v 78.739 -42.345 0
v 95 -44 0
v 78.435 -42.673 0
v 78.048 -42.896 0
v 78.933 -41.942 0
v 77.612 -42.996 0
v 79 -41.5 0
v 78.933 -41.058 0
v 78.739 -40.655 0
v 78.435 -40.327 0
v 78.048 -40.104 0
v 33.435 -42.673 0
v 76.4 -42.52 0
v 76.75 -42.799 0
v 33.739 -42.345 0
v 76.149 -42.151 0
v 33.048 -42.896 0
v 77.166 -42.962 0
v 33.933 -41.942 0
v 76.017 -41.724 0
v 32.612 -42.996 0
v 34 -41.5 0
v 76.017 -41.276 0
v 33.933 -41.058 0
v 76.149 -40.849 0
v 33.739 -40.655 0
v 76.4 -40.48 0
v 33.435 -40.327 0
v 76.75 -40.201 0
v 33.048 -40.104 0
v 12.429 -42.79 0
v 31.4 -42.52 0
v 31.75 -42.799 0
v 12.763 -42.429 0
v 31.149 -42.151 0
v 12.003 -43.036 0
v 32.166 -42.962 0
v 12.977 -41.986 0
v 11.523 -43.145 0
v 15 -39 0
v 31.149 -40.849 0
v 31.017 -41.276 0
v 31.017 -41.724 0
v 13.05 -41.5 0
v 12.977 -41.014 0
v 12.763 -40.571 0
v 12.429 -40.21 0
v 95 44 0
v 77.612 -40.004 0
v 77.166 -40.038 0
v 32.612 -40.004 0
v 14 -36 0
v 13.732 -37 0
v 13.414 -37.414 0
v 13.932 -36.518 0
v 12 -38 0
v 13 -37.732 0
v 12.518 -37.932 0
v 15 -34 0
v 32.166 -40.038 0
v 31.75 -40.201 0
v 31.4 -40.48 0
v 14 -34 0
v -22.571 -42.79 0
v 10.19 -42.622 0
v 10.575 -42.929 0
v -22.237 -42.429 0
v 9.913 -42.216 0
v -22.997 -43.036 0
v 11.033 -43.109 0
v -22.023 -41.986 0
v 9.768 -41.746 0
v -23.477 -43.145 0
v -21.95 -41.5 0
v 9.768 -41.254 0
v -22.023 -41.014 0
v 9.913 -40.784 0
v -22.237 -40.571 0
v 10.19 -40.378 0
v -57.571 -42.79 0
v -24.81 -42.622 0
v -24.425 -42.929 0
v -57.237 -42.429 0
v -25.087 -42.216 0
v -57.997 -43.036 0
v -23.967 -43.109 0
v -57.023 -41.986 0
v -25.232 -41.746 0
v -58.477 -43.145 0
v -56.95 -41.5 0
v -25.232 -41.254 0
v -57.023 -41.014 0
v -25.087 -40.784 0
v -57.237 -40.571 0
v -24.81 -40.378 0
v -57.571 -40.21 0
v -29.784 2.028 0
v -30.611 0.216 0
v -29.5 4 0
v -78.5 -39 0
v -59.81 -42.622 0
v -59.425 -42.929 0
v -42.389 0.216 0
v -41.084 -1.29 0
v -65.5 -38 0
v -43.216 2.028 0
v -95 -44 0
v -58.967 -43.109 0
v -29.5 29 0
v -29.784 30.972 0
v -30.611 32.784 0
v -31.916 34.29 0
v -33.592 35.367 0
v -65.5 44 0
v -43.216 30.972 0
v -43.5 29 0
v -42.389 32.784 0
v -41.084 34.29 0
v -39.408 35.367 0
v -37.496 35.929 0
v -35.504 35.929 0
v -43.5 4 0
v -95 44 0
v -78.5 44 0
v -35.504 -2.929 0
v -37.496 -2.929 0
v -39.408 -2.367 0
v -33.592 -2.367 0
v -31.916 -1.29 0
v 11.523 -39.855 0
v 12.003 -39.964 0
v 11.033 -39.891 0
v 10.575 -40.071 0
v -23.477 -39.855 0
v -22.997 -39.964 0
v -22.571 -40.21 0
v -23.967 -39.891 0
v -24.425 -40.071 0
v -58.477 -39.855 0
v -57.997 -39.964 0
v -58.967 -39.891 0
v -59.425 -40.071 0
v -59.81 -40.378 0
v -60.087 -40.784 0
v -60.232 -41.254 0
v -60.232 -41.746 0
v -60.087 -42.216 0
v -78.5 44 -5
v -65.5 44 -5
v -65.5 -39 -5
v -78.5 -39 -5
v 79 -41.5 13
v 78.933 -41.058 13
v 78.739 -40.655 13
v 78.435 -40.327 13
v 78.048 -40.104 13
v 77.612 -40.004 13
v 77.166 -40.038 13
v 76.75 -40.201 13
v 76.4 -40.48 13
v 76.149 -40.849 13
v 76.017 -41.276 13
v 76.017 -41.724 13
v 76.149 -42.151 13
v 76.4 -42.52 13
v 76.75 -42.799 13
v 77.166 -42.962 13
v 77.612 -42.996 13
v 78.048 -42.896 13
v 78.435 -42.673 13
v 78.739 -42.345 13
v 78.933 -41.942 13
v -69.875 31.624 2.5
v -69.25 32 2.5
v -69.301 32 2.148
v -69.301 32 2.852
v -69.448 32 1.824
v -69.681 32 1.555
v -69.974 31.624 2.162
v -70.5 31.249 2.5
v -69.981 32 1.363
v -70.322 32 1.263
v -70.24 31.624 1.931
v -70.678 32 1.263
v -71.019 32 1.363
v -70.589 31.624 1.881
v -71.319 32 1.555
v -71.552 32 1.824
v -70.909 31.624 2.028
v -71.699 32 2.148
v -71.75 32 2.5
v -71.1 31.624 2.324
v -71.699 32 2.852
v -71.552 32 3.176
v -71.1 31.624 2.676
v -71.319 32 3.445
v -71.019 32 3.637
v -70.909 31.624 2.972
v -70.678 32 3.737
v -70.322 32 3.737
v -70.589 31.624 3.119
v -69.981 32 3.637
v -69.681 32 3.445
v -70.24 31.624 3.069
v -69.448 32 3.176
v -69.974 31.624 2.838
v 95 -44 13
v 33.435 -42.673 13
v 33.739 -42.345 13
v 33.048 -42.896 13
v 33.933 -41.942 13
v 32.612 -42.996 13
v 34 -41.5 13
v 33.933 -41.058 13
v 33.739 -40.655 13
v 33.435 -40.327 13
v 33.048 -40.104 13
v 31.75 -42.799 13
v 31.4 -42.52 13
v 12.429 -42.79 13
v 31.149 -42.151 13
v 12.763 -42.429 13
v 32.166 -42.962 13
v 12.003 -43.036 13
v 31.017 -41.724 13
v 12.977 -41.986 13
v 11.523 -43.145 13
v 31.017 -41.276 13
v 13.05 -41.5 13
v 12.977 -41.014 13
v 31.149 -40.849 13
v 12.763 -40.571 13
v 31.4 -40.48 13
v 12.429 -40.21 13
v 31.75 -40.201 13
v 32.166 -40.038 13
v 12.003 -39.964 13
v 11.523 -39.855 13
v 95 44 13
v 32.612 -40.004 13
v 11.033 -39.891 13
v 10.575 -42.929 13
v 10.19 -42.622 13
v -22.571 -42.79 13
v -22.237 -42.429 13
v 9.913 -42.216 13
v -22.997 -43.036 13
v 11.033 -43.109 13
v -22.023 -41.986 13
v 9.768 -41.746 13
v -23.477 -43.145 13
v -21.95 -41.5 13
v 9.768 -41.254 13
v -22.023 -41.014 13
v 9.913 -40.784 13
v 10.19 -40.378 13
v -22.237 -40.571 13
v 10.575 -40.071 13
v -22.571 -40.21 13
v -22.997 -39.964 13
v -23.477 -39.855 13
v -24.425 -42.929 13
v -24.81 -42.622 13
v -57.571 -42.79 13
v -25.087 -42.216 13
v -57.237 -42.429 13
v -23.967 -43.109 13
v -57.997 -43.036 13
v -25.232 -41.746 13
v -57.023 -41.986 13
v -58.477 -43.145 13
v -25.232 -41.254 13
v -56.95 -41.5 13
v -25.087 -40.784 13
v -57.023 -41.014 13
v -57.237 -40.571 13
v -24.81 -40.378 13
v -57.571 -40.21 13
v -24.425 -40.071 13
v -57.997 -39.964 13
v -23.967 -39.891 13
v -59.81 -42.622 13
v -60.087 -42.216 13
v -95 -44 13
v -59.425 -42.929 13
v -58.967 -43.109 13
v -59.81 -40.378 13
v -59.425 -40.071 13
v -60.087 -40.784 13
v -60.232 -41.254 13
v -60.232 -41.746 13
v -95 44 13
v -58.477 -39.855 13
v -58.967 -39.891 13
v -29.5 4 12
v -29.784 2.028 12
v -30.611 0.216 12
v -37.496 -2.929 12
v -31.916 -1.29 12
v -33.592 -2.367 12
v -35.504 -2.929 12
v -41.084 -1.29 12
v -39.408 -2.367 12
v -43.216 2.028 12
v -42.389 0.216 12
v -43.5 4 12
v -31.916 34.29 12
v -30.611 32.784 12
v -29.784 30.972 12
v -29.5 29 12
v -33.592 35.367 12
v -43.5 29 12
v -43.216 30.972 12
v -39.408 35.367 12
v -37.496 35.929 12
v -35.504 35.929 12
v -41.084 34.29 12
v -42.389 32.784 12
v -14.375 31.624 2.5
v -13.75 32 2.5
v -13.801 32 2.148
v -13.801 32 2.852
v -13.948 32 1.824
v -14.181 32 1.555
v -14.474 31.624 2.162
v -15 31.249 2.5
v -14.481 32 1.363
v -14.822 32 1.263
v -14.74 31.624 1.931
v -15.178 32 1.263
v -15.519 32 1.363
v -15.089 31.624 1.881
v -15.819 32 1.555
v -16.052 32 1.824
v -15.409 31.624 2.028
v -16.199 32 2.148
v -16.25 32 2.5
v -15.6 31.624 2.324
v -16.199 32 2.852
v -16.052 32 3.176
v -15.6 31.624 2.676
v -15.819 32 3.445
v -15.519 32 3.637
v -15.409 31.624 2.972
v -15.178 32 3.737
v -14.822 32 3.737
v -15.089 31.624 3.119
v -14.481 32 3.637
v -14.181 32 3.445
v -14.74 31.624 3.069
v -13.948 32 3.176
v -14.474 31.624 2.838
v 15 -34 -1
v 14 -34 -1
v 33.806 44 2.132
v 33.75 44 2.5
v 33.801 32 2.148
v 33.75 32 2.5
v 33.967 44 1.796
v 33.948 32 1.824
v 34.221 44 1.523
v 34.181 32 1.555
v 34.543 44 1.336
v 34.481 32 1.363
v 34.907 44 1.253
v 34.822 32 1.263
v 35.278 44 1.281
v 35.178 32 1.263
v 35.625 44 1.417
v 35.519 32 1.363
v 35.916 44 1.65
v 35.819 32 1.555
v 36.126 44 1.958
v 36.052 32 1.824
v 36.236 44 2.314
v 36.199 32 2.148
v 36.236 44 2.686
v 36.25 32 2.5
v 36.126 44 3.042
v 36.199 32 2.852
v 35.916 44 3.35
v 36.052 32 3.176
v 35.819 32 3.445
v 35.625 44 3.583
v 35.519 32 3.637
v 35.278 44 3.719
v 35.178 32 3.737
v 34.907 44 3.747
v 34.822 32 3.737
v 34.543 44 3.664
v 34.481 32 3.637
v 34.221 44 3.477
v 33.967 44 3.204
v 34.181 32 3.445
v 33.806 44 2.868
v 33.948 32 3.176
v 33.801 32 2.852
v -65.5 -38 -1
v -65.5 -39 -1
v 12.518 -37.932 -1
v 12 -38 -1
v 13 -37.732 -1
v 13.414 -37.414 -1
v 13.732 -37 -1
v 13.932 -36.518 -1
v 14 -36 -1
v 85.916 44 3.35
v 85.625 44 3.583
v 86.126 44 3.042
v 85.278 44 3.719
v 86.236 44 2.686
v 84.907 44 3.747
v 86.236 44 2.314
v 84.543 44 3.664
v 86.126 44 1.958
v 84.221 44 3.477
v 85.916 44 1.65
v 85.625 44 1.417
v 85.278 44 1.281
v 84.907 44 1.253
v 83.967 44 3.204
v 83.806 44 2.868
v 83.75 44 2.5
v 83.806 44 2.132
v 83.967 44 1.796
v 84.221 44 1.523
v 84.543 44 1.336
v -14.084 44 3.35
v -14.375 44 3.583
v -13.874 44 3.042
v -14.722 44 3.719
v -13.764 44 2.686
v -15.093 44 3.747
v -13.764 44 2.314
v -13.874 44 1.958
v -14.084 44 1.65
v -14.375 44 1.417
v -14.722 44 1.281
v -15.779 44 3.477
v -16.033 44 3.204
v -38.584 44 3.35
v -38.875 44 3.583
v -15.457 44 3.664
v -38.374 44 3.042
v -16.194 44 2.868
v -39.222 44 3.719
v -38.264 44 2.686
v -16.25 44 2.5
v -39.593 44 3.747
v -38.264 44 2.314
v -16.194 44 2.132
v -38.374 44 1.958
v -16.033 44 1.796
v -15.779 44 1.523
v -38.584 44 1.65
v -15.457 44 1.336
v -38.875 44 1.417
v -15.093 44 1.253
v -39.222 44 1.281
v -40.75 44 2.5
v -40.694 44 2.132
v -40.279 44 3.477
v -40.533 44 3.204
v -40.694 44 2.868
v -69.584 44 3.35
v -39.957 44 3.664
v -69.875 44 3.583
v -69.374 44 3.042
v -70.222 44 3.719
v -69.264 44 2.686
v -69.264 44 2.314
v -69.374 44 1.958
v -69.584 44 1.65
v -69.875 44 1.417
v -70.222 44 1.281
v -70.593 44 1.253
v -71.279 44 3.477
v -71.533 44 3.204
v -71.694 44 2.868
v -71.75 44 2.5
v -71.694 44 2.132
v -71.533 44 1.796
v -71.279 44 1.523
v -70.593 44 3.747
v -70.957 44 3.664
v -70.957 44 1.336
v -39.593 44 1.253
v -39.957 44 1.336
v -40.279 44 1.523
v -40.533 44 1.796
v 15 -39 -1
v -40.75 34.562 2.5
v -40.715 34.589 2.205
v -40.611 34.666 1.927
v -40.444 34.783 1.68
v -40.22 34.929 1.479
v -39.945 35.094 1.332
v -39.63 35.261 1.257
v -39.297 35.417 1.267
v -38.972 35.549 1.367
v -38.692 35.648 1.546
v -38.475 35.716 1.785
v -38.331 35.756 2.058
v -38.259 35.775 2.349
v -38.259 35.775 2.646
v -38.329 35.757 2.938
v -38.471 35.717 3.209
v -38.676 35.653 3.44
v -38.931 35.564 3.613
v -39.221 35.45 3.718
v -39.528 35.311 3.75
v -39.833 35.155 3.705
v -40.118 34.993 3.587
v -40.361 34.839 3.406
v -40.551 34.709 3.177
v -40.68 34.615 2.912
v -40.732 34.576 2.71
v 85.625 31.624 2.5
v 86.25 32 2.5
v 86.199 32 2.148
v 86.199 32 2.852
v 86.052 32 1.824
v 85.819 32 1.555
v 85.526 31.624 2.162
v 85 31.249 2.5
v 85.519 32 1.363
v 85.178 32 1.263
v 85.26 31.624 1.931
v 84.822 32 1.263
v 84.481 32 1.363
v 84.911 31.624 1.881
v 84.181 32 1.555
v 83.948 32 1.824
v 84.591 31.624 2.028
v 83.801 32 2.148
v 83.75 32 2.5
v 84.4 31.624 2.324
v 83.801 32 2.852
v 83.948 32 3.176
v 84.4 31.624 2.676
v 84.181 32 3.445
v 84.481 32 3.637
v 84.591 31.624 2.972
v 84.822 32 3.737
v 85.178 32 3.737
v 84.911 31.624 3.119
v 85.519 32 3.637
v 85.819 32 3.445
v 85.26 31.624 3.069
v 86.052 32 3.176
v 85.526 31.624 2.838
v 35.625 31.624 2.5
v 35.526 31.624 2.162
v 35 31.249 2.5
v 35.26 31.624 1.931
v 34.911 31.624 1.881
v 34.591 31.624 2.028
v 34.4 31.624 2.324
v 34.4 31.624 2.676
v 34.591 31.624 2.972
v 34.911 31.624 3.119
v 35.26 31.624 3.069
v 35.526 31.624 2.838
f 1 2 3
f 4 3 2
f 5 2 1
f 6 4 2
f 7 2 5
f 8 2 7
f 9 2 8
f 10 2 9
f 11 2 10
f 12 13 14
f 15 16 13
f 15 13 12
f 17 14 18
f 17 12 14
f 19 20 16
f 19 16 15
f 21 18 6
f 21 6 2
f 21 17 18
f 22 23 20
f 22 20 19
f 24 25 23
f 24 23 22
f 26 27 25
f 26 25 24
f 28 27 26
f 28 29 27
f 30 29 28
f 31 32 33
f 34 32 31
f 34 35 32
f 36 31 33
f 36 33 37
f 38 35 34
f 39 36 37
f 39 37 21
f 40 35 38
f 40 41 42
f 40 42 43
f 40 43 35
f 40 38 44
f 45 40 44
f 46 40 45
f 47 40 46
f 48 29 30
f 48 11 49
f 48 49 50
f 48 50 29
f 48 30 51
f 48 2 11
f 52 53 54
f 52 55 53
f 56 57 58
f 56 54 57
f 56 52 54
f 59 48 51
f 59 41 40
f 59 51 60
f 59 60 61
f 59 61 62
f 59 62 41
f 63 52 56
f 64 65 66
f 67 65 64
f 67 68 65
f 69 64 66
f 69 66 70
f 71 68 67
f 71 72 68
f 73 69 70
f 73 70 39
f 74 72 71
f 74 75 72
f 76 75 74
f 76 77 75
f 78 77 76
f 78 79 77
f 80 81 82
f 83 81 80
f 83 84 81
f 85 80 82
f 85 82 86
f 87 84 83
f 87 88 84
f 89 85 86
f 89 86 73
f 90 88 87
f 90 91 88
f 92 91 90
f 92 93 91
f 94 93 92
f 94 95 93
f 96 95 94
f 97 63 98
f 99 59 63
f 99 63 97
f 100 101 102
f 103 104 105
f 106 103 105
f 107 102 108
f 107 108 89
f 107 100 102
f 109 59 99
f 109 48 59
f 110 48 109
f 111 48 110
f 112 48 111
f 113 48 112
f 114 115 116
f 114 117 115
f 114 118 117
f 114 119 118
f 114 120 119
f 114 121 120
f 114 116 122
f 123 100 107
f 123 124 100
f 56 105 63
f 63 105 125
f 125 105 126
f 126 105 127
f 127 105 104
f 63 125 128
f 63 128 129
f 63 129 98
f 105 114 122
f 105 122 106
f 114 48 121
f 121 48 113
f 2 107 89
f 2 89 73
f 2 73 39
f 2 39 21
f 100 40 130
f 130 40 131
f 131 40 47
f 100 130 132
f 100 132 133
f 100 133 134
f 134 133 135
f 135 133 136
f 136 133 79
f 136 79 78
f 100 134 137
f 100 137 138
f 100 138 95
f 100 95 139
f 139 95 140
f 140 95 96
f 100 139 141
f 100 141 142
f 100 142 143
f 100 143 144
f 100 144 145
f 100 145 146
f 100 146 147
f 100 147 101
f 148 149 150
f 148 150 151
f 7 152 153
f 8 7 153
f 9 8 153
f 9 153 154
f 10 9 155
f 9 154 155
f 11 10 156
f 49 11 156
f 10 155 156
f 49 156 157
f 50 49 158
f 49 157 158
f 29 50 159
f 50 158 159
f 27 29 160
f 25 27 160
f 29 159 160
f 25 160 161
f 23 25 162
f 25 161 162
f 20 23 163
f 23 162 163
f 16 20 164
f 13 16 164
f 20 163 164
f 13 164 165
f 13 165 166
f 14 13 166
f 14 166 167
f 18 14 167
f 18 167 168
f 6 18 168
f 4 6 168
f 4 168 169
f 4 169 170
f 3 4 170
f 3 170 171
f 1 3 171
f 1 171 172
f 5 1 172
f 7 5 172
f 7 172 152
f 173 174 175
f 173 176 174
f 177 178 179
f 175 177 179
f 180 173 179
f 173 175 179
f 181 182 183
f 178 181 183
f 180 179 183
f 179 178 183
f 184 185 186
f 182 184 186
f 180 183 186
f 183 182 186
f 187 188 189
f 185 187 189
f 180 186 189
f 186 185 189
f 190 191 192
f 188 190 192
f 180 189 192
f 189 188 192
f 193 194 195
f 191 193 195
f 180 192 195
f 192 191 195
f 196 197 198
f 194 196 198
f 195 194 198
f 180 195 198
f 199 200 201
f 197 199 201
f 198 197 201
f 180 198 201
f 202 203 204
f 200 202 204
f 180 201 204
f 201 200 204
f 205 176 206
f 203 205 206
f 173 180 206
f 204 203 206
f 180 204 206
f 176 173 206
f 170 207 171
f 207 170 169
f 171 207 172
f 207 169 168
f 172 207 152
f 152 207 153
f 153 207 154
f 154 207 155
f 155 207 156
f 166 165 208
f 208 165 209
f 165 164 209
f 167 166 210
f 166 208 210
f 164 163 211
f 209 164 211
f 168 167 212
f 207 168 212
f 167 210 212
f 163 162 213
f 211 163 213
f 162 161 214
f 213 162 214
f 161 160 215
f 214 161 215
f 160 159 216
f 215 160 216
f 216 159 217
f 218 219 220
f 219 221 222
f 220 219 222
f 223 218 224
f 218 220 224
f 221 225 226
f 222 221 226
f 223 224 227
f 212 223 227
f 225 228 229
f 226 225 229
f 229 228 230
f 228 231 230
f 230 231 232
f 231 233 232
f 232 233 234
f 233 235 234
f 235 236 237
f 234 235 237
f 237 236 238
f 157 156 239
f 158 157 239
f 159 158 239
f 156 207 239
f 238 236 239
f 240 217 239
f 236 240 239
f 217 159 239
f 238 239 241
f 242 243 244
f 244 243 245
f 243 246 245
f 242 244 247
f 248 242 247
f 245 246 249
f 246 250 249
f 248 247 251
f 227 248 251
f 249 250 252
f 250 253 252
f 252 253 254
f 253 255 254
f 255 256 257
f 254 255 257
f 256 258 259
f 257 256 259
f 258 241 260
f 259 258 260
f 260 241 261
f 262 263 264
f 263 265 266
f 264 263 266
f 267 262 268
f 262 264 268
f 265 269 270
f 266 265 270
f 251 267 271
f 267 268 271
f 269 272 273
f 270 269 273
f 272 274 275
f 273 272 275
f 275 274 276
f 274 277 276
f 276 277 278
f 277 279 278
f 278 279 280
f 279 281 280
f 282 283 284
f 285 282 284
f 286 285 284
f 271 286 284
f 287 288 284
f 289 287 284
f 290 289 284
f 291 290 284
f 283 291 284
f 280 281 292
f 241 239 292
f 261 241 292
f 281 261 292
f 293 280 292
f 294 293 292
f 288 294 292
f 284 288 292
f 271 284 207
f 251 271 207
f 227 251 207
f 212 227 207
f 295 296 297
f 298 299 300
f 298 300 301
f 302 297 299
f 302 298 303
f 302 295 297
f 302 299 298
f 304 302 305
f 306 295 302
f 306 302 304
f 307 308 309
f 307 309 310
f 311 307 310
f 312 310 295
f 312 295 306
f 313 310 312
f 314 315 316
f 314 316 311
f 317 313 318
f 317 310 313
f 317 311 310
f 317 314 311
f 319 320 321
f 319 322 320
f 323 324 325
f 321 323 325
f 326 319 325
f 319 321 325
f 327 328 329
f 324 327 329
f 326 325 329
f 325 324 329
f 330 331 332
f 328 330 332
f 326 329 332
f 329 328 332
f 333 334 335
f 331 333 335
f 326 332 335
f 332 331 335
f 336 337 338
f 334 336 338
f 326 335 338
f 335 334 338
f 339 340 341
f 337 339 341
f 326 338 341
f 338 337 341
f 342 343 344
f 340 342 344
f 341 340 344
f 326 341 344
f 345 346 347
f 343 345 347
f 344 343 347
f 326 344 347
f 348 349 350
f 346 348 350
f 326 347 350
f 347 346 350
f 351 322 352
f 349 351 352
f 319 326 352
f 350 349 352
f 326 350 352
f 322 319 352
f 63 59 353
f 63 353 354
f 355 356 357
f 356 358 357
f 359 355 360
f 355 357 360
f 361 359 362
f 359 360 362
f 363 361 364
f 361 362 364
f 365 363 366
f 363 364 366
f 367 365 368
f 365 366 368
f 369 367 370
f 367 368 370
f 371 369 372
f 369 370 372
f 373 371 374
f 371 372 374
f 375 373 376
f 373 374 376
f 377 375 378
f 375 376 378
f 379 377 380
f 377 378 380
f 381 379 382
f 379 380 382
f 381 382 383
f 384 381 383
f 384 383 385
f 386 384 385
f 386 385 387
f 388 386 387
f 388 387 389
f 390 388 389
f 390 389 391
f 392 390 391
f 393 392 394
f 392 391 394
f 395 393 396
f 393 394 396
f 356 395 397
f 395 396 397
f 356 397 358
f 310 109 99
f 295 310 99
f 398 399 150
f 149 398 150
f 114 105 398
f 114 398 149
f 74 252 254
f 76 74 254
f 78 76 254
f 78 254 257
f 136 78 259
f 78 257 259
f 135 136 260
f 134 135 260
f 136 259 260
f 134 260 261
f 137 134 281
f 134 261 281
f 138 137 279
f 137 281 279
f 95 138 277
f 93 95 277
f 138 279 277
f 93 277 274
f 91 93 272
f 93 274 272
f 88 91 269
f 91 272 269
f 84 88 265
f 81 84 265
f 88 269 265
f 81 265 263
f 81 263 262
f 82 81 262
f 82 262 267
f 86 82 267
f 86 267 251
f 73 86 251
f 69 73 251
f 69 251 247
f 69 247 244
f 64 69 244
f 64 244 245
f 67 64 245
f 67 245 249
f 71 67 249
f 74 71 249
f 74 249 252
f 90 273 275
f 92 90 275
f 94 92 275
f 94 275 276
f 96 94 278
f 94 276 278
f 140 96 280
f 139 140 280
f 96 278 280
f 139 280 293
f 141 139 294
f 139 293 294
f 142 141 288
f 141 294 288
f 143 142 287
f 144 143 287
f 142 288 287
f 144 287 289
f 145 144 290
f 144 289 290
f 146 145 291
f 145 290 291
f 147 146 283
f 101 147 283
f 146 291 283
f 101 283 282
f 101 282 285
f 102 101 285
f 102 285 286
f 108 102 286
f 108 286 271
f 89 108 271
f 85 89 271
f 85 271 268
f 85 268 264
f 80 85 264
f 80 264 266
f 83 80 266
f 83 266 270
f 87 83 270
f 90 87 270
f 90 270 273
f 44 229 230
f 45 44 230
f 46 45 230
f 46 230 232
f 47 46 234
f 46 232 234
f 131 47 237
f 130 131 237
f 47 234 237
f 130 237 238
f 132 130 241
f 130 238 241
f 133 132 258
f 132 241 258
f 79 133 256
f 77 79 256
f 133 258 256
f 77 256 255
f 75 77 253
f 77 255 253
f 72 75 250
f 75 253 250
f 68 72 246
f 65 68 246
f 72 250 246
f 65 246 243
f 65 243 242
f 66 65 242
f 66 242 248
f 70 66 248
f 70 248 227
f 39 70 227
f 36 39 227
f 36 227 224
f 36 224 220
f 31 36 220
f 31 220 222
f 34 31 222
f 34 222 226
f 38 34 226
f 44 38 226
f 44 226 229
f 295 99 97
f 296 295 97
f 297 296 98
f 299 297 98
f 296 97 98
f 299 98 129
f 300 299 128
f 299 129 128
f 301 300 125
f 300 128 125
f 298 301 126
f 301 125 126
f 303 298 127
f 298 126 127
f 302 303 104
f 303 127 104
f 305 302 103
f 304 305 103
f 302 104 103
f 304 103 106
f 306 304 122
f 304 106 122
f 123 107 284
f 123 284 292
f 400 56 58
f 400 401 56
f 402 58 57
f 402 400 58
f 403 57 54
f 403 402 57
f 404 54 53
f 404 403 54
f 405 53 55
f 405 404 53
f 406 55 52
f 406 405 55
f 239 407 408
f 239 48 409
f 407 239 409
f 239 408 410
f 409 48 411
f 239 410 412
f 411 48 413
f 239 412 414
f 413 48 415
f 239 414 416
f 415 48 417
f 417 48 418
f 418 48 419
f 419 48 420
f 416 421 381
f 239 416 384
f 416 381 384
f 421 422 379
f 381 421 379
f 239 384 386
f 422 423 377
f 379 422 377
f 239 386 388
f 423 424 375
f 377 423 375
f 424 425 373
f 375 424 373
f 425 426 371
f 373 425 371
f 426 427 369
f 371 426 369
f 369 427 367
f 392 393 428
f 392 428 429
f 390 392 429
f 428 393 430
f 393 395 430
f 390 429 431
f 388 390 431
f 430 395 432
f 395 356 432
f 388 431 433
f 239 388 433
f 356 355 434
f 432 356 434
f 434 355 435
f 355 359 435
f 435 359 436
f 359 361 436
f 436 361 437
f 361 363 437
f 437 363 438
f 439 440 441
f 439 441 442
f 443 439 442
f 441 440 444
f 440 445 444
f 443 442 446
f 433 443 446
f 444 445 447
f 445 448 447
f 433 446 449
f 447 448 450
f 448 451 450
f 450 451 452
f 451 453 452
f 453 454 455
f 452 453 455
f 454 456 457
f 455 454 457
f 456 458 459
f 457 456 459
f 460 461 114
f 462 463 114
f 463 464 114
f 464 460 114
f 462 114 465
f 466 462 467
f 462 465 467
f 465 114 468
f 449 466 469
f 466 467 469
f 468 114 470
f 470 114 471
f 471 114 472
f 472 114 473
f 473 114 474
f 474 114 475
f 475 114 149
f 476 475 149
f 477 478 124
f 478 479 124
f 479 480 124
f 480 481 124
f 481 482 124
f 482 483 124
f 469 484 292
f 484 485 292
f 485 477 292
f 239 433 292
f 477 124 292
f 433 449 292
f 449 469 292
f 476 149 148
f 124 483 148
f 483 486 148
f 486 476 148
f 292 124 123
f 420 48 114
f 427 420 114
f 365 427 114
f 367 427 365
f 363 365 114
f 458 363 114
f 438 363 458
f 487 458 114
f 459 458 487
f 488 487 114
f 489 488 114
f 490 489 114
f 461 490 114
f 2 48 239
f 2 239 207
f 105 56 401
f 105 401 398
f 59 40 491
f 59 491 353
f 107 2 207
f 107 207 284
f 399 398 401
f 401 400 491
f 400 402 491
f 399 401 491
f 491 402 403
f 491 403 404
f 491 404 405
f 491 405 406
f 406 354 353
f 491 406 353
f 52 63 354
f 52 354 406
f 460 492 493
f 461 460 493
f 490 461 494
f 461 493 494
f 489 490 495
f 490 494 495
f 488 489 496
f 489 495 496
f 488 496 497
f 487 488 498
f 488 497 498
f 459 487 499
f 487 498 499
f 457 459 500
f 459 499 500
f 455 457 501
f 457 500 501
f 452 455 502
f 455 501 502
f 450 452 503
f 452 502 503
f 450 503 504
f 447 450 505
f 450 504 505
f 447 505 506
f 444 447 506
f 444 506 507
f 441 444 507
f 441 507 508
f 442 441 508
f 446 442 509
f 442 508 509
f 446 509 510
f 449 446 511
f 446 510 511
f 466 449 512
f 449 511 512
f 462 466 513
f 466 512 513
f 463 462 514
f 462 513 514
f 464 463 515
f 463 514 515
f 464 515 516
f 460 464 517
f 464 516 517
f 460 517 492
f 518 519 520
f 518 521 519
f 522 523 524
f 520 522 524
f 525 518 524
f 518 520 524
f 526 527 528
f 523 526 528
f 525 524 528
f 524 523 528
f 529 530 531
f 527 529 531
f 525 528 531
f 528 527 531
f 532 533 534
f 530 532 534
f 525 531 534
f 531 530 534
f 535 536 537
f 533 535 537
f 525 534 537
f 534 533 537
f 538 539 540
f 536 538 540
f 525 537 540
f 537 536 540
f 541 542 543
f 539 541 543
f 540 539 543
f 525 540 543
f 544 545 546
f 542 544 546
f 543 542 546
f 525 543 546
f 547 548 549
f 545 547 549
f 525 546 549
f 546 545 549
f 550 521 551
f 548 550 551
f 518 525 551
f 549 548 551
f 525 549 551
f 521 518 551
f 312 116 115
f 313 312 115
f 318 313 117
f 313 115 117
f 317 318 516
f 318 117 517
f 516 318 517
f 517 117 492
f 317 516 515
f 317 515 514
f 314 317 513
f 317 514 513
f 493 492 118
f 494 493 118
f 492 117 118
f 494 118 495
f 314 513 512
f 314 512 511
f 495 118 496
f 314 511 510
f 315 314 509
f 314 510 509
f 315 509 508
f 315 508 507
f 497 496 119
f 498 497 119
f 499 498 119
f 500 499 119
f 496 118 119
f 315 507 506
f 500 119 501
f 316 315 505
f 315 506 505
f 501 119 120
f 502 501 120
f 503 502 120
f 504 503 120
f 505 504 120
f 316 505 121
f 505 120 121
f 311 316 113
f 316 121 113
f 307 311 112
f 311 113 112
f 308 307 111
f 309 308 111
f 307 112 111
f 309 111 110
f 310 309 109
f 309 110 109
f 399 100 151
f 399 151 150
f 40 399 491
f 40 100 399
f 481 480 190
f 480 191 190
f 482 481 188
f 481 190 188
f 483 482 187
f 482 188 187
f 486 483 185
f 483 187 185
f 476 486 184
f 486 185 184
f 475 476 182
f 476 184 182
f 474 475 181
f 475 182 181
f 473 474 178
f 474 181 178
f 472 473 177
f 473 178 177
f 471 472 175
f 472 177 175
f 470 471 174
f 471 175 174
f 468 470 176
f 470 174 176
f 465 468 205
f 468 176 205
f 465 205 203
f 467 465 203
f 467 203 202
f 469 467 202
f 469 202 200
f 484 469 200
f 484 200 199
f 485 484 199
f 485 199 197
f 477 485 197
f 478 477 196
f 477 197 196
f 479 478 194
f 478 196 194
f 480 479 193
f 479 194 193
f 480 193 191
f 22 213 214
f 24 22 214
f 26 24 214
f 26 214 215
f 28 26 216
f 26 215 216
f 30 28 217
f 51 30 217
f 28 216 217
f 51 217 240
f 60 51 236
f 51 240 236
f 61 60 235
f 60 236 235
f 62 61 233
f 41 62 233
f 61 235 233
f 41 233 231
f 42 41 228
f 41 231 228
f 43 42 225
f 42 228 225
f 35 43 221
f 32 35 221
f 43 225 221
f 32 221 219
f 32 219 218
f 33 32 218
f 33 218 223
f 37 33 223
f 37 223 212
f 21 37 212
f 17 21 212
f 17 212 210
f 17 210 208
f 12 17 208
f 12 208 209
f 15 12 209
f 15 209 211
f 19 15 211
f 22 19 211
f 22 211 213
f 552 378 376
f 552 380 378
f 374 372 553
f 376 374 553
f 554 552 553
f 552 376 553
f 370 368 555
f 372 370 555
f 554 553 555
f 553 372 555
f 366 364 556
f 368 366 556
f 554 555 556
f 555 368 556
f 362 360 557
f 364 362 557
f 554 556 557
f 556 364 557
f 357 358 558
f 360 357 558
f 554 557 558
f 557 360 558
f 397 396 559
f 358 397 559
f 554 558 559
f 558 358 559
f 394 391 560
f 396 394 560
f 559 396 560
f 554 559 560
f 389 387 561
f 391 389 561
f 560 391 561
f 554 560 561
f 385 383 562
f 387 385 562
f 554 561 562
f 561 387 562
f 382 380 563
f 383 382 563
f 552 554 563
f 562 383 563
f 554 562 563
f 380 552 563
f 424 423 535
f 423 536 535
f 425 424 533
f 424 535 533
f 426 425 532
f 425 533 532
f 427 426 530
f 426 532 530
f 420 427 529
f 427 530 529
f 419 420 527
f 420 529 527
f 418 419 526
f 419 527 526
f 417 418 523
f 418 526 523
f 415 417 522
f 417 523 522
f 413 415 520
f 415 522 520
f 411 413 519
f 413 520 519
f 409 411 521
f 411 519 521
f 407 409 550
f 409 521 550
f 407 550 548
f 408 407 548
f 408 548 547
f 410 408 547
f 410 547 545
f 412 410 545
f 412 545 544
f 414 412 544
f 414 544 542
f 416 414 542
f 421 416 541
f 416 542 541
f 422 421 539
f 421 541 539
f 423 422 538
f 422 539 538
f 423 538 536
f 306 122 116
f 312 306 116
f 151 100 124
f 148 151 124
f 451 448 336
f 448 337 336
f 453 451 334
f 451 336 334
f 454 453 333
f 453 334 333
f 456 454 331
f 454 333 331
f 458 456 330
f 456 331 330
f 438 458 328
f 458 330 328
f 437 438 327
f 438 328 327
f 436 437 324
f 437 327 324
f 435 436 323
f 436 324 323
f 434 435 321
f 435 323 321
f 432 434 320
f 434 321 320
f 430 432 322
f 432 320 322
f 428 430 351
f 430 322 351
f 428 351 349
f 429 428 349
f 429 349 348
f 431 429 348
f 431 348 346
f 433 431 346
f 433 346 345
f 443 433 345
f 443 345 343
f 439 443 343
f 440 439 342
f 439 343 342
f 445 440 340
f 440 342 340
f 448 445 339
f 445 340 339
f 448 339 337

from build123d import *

# Parameters (mm, degrees)
BOSS_EXTRUDE1_DEPTH    = 13
SKETCH3_R              = 1.65
SKETCH3_R_2            = 1.5
CUT_EXTRUDE1_DEPTH     = 14
SKETCH4_W              = 13
SKETCH4_H              = 83
BOSS_EXTRUDE2_DEPTH    = 5
BOSS_EXTRUDE3_DEPTH    = 1
FILLET1_R              = 2
HOLE_WIZARD_M3_1_D     = 2.5
HOLE_WIZARD_M3_1_DEPTH = 12
HOLE_WIZARD_M3_1_TIP   = 0.751075774
CUT_EXTRUDE_1_DEPTH    = 17


with BuildPart() as part:
    # Sketch1 → Boss-Extrude1 (new body)
    with BuildSketch(Plane.XY):
        Polygon((-95, 44), (-35, 44), (95, 44), (95, -44), (-95, -44), align=None)
    extrude(amount=BOSS_EXTRUDE1_DEPTH)

    # Sketch3 → Cut-Extrude1 (cut, through all)
    with BuildSketch(Plane.XY.offset(13)):
        with Locations((-58.6, -41.5)):
            Circle(SKETCH3_R)
        with Locations((-23.6, -41.5)):
            Circle(SKETCH3_R)
        with Locations((11.4, -41.5)):
            Circle(SKETCH3_R)
        with Locations((32.5, -41.5)):
            Circle(SKETCH3_R_2)
        with Locations((77.5, -41.5)):
            Circle(SKETCH3_R_2)
    extrude(amount=-CUT_EXTRUDE1_DEPTH, mode=Mode.SUBTRACT)

    # Sketch4 → Boss-Extrude2 (add)
    with BuildSketch(Plane(origin=(0, 0, 0), x_dir=(-1, 0, 0), z_dir=(0, 0, -1))):
        with Locations((72, 2.5)):
            Rectangle(SKETCH4_W, SKETCH4_H)
    extrude(amount=BOSS_EXTRUDE2_DEPTH)

    # Sketch5 → Boss-Extrude3 (add)
    with BuildSketch(Plane(origin=(0, 0, 0), x_dir=(-1, 0, 0), z_dir=(0, 0, -1))):
        Polygon((65.5, -39), (-15, -39), (-15, -34), (-14, -34), (-14, -38), (65.5, -38), align=None)
    extrude(amount=BOSS_EXTRUDE3_DEPTH)

    # Fillet1
    fillet1_edges = [part.edges().sort_by_distance(p)[0] for p in [
        (14, -38, -0.5),
    ]]
    fillet(fillet1_edges, radius=FILLET1_R)

    # M3 螺纹孔1
    with Locations(Plane(origin=(-70.5, 44, 2.5), x_dir=(1, 0, 0), z_dir=(0, 1, 0))):
        with Locations((0, 0), (31, 0), (55.5, 0), (105.5, 0), (155.5, 0)):
            Hole(HOLE_WIZARD_M3_1_D / 2, depth=HOLE_WIZARD_M3_1_DEPTH)
            with Locations((0, 0, -(HOLE_WIZARD_M3_1_DEPTH + HOLE_WIZARD_M3_1_TIP / 2))):  # 118° drill point
                Cone(0, HOLE_WIZARD_M3_1_D / 2, HOLE_WIZARD_M3_1_TIP, mode=Mode.SUBTRACT)

    # 草图4 → 切除-拉伸1 (cut)
    with BuildSketch(Plane(origin=(0, 0, -5), x_dir=(-1, 0, 0), z_dir=(0, 0, -1))):
        with BuildLine():
            Line((29.5, 29), (29.5, 4))
            ThreePointArc((29.5, 4), (36.5, -3), (43.5, 4))
            Line((43.5, 4), (43.5, 29))
            ThreePointArc((43.5, 29), (36.5, 36), (29.5, 29))
        make_face()
    extrude(amount=-CUT_EXTRUDE_1_DEPTH, mode=Mode.SUBTRACT)


solid = part.part
